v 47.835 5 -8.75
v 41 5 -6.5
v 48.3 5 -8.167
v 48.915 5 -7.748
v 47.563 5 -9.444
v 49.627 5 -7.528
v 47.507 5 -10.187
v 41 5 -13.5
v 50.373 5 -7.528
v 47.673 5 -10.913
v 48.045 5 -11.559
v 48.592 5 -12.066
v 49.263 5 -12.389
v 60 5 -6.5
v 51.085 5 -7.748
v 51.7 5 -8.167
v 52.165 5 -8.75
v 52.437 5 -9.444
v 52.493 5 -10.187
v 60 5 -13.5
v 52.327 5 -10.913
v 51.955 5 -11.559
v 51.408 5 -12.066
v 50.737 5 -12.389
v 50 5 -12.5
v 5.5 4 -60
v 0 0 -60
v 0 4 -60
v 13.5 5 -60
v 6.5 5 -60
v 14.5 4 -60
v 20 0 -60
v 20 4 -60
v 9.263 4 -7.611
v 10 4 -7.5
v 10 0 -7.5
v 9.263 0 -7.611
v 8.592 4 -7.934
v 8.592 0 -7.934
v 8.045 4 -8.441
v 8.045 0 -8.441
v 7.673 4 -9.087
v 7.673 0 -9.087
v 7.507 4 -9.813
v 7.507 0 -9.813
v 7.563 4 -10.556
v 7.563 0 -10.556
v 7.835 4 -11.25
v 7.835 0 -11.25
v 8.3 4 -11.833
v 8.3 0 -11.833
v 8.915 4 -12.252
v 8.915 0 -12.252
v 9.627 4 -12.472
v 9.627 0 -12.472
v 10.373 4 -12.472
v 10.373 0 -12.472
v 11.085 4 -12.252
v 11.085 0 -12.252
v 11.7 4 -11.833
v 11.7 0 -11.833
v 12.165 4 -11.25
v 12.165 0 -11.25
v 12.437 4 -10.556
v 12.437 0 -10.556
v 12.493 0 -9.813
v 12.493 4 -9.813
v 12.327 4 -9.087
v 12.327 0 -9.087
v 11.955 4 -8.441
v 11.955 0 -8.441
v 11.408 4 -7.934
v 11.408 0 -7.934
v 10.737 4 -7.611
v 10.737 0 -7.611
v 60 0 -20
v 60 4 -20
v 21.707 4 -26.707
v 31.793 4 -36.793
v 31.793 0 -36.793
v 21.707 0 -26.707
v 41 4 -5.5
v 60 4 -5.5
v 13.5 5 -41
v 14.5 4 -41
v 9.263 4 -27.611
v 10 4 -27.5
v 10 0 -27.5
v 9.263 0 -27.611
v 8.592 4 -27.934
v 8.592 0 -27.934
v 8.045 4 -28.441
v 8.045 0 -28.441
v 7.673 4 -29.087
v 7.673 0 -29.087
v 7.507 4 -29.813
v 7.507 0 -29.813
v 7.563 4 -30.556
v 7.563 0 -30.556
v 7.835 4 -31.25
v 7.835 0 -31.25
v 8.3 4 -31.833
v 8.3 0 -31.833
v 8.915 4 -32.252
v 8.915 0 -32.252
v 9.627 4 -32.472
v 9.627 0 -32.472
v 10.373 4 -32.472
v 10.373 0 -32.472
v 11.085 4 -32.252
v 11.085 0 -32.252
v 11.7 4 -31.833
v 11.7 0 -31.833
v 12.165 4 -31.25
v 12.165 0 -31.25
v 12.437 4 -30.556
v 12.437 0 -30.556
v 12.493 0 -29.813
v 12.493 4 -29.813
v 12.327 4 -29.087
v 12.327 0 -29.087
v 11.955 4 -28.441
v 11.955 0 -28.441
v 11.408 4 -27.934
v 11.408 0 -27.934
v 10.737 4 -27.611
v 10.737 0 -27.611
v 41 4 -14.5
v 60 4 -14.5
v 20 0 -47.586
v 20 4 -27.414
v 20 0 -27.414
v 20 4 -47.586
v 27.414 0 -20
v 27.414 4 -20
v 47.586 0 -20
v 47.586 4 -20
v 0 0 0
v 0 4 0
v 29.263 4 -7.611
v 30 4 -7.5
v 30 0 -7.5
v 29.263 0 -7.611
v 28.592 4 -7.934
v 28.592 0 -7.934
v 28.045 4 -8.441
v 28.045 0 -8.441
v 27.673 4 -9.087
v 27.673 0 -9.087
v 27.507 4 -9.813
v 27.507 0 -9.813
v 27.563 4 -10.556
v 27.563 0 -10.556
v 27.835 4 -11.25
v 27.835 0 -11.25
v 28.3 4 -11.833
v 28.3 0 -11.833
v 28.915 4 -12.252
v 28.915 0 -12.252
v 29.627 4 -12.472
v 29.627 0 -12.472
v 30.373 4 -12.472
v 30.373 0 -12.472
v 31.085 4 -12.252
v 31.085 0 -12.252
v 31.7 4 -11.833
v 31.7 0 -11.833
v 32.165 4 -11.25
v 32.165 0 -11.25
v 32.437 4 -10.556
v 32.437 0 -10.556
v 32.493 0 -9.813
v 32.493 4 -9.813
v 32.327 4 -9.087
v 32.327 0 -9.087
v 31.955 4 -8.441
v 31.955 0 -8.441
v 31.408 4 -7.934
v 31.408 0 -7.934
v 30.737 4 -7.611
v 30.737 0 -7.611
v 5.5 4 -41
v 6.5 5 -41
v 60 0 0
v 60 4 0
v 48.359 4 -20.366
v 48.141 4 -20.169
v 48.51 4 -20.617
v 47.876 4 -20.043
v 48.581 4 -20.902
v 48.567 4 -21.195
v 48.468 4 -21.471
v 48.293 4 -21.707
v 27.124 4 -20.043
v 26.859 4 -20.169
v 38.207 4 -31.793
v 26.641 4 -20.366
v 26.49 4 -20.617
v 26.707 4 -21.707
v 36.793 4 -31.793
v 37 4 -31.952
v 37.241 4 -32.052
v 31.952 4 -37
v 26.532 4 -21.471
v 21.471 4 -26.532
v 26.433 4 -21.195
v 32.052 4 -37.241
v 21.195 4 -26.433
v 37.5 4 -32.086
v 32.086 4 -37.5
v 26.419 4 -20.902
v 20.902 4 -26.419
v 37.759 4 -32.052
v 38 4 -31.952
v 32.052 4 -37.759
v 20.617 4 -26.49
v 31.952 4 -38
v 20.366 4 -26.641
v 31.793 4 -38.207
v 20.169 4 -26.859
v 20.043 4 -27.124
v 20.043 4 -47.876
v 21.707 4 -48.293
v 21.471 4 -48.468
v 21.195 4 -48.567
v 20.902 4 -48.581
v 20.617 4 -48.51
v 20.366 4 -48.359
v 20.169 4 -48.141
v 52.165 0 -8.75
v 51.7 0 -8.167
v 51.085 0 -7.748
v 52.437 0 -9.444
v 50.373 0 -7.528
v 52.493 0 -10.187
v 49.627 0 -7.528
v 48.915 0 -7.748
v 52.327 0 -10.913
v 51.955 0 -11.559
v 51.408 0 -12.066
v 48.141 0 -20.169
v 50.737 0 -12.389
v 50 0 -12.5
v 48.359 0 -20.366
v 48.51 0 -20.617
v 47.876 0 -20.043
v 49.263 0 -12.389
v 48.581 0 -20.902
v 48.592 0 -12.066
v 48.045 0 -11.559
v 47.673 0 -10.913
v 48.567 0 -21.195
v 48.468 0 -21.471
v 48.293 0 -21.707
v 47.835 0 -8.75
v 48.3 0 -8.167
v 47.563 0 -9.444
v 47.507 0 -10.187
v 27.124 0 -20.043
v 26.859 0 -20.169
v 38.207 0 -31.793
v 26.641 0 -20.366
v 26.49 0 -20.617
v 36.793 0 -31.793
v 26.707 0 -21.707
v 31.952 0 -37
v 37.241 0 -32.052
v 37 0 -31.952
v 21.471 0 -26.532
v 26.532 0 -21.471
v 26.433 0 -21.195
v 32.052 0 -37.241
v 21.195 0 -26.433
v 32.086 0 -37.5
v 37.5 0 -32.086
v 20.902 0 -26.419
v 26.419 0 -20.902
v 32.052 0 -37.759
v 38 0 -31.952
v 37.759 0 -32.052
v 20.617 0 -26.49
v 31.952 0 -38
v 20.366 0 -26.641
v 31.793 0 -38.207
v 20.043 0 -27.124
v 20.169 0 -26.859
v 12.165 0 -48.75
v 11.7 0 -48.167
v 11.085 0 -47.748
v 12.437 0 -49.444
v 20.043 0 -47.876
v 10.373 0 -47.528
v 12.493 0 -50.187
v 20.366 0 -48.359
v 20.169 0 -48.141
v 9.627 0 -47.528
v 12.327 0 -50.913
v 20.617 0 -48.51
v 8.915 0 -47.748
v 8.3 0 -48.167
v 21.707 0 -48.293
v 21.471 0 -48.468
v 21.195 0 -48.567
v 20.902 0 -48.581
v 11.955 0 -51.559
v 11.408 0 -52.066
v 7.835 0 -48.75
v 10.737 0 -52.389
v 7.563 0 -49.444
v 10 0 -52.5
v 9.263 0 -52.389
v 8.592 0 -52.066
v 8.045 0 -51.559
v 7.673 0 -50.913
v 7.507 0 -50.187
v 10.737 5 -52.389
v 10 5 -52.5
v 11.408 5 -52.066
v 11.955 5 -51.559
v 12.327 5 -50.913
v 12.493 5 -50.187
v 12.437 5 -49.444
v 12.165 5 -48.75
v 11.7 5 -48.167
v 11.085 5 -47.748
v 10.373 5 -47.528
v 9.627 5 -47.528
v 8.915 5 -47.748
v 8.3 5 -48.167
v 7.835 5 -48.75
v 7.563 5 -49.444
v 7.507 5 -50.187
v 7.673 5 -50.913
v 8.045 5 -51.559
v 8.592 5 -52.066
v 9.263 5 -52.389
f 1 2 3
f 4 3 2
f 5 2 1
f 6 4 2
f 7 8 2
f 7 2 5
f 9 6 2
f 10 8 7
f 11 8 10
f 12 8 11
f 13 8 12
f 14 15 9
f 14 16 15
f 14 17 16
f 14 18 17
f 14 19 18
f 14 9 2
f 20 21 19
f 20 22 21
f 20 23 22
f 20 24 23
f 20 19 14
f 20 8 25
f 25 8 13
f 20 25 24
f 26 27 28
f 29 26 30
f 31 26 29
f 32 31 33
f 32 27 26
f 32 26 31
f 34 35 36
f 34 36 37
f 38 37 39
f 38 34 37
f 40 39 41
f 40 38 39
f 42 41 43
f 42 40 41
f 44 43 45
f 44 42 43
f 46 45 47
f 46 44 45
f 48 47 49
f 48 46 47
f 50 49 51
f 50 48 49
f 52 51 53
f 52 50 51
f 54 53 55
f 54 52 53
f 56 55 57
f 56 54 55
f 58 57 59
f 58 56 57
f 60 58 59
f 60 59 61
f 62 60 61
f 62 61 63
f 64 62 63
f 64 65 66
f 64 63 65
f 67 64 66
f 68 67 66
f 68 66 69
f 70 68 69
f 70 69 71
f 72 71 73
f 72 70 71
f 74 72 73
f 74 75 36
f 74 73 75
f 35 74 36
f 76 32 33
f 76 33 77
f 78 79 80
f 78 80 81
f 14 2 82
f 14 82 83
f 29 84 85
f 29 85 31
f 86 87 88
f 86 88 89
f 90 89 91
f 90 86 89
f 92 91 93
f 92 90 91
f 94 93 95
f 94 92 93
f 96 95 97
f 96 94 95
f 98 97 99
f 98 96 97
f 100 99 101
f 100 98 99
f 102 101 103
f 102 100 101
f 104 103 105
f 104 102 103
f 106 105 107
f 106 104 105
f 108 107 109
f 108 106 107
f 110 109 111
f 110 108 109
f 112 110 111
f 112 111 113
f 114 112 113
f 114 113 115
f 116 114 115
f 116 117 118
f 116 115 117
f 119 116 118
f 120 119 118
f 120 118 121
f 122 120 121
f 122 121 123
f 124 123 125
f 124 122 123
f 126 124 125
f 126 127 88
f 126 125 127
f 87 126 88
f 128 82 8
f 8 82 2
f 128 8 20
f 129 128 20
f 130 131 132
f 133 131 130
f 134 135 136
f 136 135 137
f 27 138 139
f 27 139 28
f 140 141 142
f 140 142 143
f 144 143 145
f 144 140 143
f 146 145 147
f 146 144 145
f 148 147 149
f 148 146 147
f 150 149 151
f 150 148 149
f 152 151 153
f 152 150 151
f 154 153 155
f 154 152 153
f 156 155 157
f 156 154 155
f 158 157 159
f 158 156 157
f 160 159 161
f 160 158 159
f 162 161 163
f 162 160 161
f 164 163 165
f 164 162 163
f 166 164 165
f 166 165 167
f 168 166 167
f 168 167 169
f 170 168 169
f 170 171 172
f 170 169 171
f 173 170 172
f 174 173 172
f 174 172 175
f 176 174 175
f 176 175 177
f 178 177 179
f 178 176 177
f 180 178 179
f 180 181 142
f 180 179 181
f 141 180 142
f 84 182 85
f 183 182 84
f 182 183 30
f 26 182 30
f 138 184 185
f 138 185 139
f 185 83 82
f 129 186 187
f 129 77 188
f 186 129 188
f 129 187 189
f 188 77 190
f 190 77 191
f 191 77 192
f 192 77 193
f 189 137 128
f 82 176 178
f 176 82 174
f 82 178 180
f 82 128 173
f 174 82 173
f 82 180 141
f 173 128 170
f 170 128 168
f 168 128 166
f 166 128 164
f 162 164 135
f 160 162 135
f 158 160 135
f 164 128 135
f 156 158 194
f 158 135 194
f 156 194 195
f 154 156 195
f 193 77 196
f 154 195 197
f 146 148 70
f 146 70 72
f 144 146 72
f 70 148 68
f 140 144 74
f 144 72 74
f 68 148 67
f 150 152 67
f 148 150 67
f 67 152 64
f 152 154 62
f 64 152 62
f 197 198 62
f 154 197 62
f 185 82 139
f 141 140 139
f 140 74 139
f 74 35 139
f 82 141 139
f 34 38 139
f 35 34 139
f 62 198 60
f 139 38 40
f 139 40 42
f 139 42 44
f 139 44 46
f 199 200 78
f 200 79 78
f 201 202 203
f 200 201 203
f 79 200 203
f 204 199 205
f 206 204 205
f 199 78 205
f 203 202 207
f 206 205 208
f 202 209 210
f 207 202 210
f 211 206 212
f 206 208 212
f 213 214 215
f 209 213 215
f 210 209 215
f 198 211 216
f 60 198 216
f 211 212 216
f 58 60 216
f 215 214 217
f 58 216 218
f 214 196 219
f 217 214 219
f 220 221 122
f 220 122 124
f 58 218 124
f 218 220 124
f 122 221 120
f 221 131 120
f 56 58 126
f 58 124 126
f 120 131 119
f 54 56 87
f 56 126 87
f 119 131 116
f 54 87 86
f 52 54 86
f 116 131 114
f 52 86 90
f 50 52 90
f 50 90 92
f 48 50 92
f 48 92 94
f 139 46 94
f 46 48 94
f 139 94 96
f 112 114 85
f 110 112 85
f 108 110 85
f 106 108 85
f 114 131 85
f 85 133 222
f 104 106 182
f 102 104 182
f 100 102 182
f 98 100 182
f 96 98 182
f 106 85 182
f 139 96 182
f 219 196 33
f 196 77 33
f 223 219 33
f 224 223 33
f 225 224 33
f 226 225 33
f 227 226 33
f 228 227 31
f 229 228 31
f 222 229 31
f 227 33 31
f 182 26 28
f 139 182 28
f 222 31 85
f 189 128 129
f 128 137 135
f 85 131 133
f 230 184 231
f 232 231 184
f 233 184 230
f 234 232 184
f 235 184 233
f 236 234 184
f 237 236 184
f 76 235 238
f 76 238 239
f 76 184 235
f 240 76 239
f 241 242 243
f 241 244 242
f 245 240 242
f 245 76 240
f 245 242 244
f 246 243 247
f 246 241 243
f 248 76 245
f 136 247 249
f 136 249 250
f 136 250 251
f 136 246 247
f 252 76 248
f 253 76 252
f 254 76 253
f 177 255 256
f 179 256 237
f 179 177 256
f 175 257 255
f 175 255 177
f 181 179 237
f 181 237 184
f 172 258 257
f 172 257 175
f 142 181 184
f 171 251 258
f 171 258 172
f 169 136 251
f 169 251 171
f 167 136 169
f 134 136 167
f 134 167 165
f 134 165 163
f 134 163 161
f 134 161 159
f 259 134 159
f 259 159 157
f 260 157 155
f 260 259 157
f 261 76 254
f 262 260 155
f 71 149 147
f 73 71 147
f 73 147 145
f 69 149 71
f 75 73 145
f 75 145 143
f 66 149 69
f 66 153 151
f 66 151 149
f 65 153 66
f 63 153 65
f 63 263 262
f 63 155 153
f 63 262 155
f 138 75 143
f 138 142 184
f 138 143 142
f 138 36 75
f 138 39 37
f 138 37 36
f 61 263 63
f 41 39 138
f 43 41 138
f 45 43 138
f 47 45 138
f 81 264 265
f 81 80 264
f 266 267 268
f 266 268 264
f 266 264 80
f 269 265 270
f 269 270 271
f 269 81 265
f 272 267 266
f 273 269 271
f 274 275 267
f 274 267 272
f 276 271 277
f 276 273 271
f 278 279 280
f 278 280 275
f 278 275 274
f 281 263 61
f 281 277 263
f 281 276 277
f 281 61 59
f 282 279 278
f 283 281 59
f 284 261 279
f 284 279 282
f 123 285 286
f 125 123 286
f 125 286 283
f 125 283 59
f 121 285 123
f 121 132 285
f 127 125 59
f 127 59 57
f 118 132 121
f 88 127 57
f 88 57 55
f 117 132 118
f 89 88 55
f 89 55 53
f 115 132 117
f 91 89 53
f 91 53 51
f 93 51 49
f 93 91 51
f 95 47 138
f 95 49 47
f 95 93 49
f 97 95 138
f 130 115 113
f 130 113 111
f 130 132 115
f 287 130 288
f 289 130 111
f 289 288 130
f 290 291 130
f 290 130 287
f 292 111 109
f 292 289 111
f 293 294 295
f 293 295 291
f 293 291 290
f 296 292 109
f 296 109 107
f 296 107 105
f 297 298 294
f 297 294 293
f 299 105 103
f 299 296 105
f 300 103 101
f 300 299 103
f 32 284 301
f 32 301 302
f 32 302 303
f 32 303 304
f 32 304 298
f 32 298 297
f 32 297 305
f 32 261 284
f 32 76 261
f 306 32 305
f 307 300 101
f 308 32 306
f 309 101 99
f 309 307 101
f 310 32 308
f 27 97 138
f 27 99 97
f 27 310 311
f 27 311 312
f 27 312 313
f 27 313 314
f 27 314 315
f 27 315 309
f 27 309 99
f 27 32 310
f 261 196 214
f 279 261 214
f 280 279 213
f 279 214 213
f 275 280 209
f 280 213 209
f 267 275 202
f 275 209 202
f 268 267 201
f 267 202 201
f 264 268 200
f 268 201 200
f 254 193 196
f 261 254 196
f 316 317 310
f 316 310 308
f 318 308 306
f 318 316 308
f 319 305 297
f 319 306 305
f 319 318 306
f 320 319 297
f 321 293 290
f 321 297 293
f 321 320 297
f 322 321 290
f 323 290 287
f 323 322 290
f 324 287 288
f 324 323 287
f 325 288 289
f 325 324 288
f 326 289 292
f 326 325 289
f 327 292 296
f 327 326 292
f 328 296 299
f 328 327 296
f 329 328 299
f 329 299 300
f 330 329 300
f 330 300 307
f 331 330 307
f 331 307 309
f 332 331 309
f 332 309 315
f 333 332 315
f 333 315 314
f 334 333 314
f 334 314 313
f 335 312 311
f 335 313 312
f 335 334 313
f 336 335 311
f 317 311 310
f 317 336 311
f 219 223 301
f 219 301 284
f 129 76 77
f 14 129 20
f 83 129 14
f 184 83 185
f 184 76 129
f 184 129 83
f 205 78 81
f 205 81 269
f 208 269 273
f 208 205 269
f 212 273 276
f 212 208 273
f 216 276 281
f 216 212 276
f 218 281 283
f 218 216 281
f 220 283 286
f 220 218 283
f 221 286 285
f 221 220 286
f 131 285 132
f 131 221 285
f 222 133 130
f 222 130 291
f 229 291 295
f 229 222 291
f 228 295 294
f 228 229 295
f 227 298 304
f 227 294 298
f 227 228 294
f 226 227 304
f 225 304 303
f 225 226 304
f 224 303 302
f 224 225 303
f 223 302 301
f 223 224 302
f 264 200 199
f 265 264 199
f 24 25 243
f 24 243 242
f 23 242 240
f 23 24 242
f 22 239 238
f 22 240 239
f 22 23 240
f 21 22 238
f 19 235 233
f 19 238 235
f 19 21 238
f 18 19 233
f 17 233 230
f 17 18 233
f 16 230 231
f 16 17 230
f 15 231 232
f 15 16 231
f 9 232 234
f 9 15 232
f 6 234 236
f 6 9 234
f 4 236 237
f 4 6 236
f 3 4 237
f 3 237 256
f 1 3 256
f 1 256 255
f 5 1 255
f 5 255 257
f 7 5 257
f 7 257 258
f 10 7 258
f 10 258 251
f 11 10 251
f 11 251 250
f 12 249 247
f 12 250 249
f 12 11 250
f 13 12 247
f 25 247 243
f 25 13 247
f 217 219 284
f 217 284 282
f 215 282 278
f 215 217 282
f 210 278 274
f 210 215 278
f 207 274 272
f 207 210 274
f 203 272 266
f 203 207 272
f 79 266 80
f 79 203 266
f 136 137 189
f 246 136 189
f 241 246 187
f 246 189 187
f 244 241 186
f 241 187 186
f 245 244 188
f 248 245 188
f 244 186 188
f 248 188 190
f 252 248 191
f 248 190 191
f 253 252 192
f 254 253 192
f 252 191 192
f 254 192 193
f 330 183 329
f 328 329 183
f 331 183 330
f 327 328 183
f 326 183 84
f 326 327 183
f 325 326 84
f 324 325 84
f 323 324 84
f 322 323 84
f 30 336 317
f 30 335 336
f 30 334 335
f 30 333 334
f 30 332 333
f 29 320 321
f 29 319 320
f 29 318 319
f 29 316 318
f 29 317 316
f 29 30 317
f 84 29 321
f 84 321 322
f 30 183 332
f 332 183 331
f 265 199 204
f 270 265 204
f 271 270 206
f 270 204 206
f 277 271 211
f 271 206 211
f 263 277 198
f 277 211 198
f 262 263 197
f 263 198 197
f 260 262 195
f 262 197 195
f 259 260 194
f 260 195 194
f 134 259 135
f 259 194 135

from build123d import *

# Parameters (mm, degrees)
BOSS_EXTRUDE1_DEPTH     = 4
SKETCH3_W               = 9
SKETCH3_H               = 19
SKETCH3_W_2             = 19
SKETCH3_H_2             = 9
BOSS_EXTRUDE2_DEPTH     = 1
CHAMFER1_SIZE           = 1
CUT_EXTRUDE1_DEPTH      = 86
CUT_EXTRUDE1_DEPTH_BACK = 86
SKETCH2_R               = 2.5


with BuildPart() as part:
    # Sketch1 → Boss-Extrude1 (new body)
    with BuildSketch(Plane(origin=(0, 0, 0), x_dir=(1, 0, 0), z_dir=(0, 1, 0))):
        Polygon((0, 0), (0, 60), (20, 60), (60, 20), (60, 0), align=None)
    extrude(amount=BOSS_EXTRUDE1_DEPTH)

    # Sketch3 → Boss-Extrude2 (add)
    with BuildSketch(Plane(origin=(0, 4, 0), x_dir=(1, 0, 0), z_dir=(0, 1, 0))):
        with Locations((10, 50.5)):
            Rectangle(SKETCH3_W, SKETCH3_H)
        with Locations((50.5, 10)):
            Rectangle(SKETCH3_W_2, SKETCH3_H_2)
    extrude(amount=BOSS_EXTRUDE2_DEPTH)

    # Chamfer1
    chamfer1_edges = [part.edges().sort_by_distance(p)[0] for p in [
        (50.5, 5, -14.5),
        (50.5, 5, -5.5),
        (14.5, 5, -50.5),
        (5.5, 5, -50.5),
    ]]
    chamfer(chamfer1_edges, length=CHAMFER1_SIZE - 0.0001)  # a hair under: the kernel refuses the full size

    # Sketch2 → Cut-Extrude1 (cut, two sides: drawn at the far end of the back side and taken through both)
    with BuildSketch(Plane.XZ.offset(-CUT_EXTRUDE1_DEPTH_BACK)):
        with Locations(Location((50, -10, 0), (0, 0, 270))):
            Circle(SKETCH2_R)
        with Locations(Location((30, -10, 0), (0, 0, 90))):
            Circle(SKETCH2_R)
        with Locations(Location((10, -10, 0), (0, 0, 90))):
            Circle(SKETCH2_R)
        with Locations(Location((10, -30, 0), (0, 0, 90))):
            Circle(SKETCH2_R)
        with Locations(Location((10, -50, 0), (0, 0, 270))):
            Circle(SKETCH2_R)
        with BuildLine():
            Line((48.292989119, -21.707106781), (38.207130756, -31.792965144))
            ThreePointArc((38.207130756, -31.792965144), (37.500023975, -32.085858363), (36.792917194, -31.792965144))
            Line((36.792917194, -31.792965144), (26.707058831, -21.707106781))
            ThreePointArc((26.707058831, -21.707106781), (26.49028608, -20.617316568), (27.414165612, -20))
            Line((27.414165612, -20), (47.585882338, -20))
            ThreePointArc((47.585882338, -20), (48.509761871, -20.617316568), (48.292989119, -21.707106781))
        make_face()
        with BuildLine():
            Line((31.792965144, -36.792917194), (21.707106781, -26.707058831))
            ThreePointArc((21.707106781, -26.707058831), (20.617316568, -26.49028608), (20, -27.414165612))
            Line((20, -27.414165612), (20, -47.585882338))
            ThreePointArc((20, -47.585882338), (20.617316568, -48.509761871), (21.707106781, -48.292989119))
            Line((21.707106781, -48.292989119), (31.792965144, -38.207130756))
            ThreePointArc((31.792965144, -38.207130756), (32.085858363, -37.500023975), (31.792965144, -36.792917194))
        make_face()
    extrude(amount=CUT_EXTRUDE1_DEPTH + CUT_EXTRUDE1_DEPTH_BACK, mode=Mode.SUBTRACT)


solid = part.part
